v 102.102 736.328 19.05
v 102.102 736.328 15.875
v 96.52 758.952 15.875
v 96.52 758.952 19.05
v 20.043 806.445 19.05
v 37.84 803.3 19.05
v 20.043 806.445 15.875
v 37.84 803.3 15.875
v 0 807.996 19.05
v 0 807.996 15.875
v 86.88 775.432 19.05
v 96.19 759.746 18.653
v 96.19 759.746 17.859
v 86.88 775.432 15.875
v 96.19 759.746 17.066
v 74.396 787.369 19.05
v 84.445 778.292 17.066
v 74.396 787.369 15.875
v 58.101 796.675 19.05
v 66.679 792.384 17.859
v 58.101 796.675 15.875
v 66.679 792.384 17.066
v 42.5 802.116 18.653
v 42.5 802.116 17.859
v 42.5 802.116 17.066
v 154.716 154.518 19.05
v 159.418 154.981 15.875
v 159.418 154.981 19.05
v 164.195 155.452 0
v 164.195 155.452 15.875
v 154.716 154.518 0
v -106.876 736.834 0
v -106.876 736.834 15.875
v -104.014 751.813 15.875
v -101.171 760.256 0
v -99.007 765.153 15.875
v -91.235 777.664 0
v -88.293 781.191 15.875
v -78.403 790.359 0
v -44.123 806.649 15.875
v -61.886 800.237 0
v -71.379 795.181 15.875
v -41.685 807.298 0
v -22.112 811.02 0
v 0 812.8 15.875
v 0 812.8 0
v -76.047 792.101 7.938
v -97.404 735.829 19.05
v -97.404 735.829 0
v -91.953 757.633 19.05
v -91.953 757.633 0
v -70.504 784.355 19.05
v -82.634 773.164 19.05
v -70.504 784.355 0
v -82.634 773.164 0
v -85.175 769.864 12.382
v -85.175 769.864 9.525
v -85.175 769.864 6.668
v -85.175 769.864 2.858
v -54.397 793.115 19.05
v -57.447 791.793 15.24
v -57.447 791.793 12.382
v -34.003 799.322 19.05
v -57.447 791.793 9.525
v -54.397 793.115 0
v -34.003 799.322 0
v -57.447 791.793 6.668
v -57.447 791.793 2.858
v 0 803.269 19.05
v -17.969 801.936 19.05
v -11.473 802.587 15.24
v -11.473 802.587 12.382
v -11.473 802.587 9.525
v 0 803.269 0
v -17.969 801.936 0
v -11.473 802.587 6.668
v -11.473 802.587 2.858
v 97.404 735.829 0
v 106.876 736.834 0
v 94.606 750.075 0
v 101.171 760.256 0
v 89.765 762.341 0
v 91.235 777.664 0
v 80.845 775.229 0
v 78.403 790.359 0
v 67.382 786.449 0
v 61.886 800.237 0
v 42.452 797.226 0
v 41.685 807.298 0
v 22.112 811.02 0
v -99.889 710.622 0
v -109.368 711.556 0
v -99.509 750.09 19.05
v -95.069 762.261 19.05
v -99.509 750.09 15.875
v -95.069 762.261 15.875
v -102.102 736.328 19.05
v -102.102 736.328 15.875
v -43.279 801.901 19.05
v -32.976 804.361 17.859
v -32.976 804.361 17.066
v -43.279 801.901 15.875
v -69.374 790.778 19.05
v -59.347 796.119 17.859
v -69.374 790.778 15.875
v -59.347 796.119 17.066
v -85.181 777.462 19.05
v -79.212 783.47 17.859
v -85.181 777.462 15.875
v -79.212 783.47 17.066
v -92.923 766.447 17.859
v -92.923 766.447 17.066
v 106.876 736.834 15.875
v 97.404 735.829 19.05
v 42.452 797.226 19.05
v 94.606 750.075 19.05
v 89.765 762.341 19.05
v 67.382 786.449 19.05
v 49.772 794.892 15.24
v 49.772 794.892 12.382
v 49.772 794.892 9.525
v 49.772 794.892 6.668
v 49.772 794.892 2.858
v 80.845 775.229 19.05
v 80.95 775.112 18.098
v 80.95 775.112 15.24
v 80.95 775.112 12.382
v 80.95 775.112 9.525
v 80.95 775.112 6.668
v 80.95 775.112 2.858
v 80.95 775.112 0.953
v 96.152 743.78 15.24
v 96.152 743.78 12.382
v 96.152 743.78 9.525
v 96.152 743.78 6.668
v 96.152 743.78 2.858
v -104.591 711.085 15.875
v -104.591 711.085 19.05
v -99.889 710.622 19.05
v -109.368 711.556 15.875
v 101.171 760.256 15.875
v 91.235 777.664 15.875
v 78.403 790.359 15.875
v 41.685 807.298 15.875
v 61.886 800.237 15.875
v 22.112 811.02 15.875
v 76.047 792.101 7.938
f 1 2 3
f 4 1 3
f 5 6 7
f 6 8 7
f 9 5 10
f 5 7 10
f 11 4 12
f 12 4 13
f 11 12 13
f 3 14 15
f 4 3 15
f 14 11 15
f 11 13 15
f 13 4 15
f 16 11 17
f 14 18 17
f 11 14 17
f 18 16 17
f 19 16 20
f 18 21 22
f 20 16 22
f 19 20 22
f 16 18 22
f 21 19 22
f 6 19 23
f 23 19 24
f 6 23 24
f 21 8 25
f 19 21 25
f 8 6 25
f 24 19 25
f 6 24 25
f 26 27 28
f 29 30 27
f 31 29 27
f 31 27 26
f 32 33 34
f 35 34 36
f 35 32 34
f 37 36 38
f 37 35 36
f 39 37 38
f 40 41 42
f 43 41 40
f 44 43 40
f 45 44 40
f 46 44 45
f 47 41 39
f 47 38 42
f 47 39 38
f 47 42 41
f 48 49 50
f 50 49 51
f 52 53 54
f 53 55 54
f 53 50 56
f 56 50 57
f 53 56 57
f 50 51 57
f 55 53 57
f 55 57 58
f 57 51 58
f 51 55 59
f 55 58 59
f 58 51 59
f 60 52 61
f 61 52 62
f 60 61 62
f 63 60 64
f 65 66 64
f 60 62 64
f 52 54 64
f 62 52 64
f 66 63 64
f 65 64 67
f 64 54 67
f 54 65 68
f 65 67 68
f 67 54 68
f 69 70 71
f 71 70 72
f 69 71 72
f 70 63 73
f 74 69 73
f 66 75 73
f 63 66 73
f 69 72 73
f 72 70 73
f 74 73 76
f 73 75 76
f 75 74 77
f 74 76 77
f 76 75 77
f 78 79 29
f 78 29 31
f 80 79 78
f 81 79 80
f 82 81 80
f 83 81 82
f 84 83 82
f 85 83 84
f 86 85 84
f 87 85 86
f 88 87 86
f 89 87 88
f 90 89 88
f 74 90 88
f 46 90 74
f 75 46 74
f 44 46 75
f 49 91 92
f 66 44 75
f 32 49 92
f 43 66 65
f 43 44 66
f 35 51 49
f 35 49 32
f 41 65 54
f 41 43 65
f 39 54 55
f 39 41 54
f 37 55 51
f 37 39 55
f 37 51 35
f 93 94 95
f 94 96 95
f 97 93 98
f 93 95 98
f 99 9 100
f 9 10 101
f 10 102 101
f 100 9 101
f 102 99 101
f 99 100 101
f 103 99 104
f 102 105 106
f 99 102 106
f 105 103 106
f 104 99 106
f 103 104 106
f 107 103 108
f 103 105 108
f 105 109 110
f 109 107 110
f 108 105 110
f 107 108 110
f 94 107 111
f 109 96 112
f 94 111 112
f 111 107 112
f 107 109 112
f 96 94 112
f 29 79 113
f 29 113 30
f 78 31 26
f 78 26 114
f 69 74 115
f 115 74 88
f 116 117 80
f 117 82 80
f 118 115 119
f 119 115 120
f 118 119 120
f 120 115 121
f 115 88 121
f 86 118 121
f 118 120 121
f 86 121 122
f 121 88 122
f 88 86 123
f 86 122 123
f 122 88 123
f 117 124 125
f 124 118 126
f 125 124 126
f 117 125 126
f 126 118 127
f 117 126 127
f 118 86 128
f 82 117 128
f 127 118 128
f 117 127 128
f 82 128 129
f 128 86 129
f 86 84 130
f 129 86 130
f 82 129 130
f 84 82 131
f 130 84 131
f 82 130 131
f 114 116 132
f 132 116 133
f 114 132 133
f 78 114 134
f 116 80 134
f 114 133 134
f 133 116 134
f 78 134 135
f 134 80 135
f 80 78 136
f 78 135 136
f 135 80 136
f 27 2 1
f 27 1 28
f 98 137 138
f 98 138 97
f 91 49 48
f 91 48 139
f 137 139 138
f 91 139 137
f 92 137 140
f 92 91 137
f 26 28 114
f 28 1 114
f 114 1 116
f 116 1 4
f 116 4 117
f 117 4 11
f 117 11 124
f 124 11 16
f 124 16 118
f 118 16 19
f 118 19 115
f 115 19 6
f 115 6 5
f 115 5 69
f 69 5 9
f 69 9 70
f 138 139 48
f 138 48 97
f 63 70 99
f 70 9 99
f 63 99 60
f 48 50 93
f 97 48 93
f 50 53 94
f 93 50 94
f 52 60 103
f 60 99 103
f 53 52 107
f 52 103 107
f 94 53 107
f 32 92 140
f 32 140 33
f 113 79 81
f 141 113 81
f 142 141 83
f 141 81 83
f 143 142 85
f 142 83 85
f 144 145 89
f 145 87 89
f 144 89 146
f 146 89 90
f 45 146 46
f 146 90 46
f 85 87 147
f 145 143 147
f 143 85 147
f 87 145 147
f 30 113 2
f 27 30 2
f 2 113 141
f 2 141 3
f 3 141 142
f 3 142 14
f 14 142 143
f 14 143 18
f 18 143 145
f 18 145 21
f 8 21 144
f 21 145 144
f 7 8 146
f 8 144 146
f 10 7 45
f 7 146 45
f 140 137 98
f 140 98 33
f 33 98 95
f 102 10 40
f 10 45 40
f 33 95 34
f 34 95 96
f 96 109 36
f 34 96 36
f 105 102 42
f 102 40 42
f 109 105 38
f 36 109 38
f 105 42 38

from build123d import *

# Parameters (mm, degrees)
BOSS_EXTRUDE1_DEPTH = 19.05
CUT_EXTRUDE1_START  = -3.175
CUT_EXTRUDE1_DEPTH  = 3.175


# Read off the part's stored shape, not the designer's step: Cut-Extrude1
with BuildPart() as part:
    # Sketch1 → Boss-Extrude1 (new body)
    with BuildSketch(Plane.XY):
        with BuildLine():
            Line((154.716315659, 154.51789158), (97.403993572, 735.828587024))
            add(Edge.make_bspline(
                [(0, 803.26908628), (0.979817658, 803.233925105), (2.950075123, 803.151909058), (6.800362849, 802.946009068), (11.504912112, 802.608232022), (16.957304332, 802.075979486), (23.975792063, 801.198424891), (32.273128008, 799.790052384), (41.46699497, 797.614109593), (49.89784204, 794.967332344), (60.129456963, 790.832450746), (71.050790712, 784.572420078), (79.648241417, 776.932392043), (85.274313562, 769.943199813), (88.89525226, 764.228265264), (91.933130485, 758.00316425), (93.979934001, 752.359286407), (95.321414001, 747.554999291), (96.177362738, 743.805316844), (96.764020616, 740.553537606), (97.155379667, 737.881968465), (97.326205951, 736.51096636), (97.403993572, 735.828587024)],
                knots=[0.000508173, 0.000508173, 0.000508173, 0.000508173, 0.016098161, 0.031688149, 0.062868125, 0.094048101, 0.125228077, 0.187588029, 0.249947981, 0.312307933, 0.374667885, 0.499387789, 0.624107693, 0.686467645, 0.748827597, 0.811187549, 0.873547501, 0.904727477, 0.935907453, 0.967087429, 0.982677417, 0.998267405, 0.998267405, 0.998267405, 0.998267405], degree=3))
            add(Edge.make_bspline(
                [(-97.403993572, 735.828587024), (-97.326205951, 736.51096636), (-97.155379667, 737.881968465), (-96.764020616, 740.553537606), (-96.177362738, 743.805316844), (-95.321414001, 747.554999291), (-93.979934001, 752.359286407), (-91.933130485, 758.00316425), (-88.89525226, 764.228265264), (-85.274313562, 769.943199813), (-79.648241417, 776.932392043), (-71.050790712, 784.572420078), (-60.129456963, 790.832450746), (-49.89784204, 794.967332344), (-41.46699497, 797.614109593), (-32.273128008, 799.790052384), (-23.975792063, 801.198424891), (-16.957304332, 802.075979486), (-11.504912112, 802.608232022), (-6.800362849, 802.946009068), (-2.950075123, 803.151909058), (-0.979817658, 803.233925105), (0, 803.26908628)],
                knots=[0.000508173, 0.000508173, 0.000508173, 0.000508173, 0.016098161, 0.031688149, 0.062868125, 0.094048101, 0.125228077, 0.187588029, 0.249947981, 0.312307933, 0.374667885, 0.499387789, 0.624107693, 0.686467645, 0.748827597, 0.811187549, 0.873547501, 0.904727477, 0.935907453, 0.967087429, 0.982677417, 0.998267405, 0.998267405, 0.998267405, 0.998267405], degree=3))
            Line((-97.403993572, 735.828587024), (-99.889181424, 710.621681669))
            Line((-99.889181424, 710.621681669), (-109.368223301, 711.556235093))
            Line((-109.368223301, 711.556235093), (-106.876080835, 736.833680097))
            add(Edge.make_bspline(
                [(-106.876080835, 736.833680097), (-98.655564568, 809.385111394), (0, 812.8)],
                knots=[0, 0, 0, 1, 1, 1], degree=2))
            add(Edge.make_bspline(
                [(106.876080835, 736.833680097), (98.655564568, 809.385111394), (0, 812.8)],
                knots=[0, 0, 0, 1, 1, 1], degree=2))
            Line((106.876080835, 736.833680097), (164.195357535, 155.452445004))
            Line((164.195357535, 155.452445004), (154.716315659, 154.51789158))
        make_face()
    extrude(amount=BOSS_EXTRUDE1_DEPTH)

    # Cut-Extrude1 outline → Cut-Extrude1 (cut)
    with BuildSketch(Plane.XY.offset(19.05).offset(CUT_EXTRUDE1_START)):
        with BuildLine():
            add(Edge.make_bspline(
                [(1e-09, 807.996472787), (-8.059444459, 807.712436153), (-15.632797496, 807.076135514), (-29.80101283, 805.110989442), (-36.395663836, 803.782123865), (-48.604448115, 800.45028743), (-54.21823512, 798.447532439), (-64.476247681, 793.79089402), (-69.120337781, 791.137665272), (-77.472024822, 785.195018143), (-81.180369592, 781.906189414), (-87.708823445, 774.677407428), (-90.530051439, 770.736815263), (-95.315640606, 762.156711157), (-97.279926716, 757.51598974), (-100.345590506, 747.487649134), (-101.446143015, 742.099771544), (-102.102109164, 736.327515765)],
                knots=[0, 0, 0, 0, 0.125, 0.125, 0.25, 0.25, 0.375, 0.375, 0.5, 0.5, 0.625, 0.625, 0.75, 0.75, 0.875, 0.875, 1, 1, 1, 1], degree=3))
            add(Edge.make_bspline(
                [(102.102109165, 736.32751576), (101.446143015, 742.099771539), (100.345590507, 747.487649129), (97.279926717, 757.515989736), (95.315640608, 762.156711153), (90.530051441, 770.73681526), (87.708823448, 774.677407425), (81.180369595, 781.906189411), (77.472024825, 785.195018141), (69.120337784, 791.137665271), (64.476247684, 793.790894018), (54.218235123, 798.447532438), (48.604448118, 800.450287429), (36.395663839, 803.782123864), (29.801012833, 805.110989442), (15.632797499, 807.076135513), (8.059444462, 807.712436153), (1e-09, 807.996472787)],
                knots=[0, 0, 0, 0, 0.125, 0.125, 0.25, 0.25, 0.375, 0.375, 0.5, 0.5, 0.625, 0.625, 0.75, 0.75, 0.875, 0.875, 1, 1, 1, 1], degree=3))
            Line((102.102109165, 736.32751576), (159.417920429, 154.981430078))
            Line((159.417920429, 154.981430078), (164.195357535, 155.452445004))
            Line((164.195357535, 155.452445004), (106.876080835, 736.833680097))
            add(Edge.make_bspline(
                [(106.876080835, 736.833680097), (98.655564568, 809.385111394), (0, 812.8)],
                knots=[0, 0, 0, 1, 1, 1], degree=2))
            add(Edge.make_bspline(
                [(0, 812.8), (-98.655564568, 809.385111394), (-106.876080835, 736.833680097)],
                knots=[0, 0, 0, 1, 1, 1], degree=2))
            Line((-106.876080835, 736.833680097), (-109.368223301, 711.556235093))
            Line((-109.368223301, 711.556235093), (-104.590786195, 711.085220167))
            Line((-104.590786195, 711.085220167), (-102.102109164, 736.327515765))
        make_face()
    extrude(amount=CUT_EXTRUDE1_DEPTH, mode=Mode.SUBTRACT)


solid = part.part
